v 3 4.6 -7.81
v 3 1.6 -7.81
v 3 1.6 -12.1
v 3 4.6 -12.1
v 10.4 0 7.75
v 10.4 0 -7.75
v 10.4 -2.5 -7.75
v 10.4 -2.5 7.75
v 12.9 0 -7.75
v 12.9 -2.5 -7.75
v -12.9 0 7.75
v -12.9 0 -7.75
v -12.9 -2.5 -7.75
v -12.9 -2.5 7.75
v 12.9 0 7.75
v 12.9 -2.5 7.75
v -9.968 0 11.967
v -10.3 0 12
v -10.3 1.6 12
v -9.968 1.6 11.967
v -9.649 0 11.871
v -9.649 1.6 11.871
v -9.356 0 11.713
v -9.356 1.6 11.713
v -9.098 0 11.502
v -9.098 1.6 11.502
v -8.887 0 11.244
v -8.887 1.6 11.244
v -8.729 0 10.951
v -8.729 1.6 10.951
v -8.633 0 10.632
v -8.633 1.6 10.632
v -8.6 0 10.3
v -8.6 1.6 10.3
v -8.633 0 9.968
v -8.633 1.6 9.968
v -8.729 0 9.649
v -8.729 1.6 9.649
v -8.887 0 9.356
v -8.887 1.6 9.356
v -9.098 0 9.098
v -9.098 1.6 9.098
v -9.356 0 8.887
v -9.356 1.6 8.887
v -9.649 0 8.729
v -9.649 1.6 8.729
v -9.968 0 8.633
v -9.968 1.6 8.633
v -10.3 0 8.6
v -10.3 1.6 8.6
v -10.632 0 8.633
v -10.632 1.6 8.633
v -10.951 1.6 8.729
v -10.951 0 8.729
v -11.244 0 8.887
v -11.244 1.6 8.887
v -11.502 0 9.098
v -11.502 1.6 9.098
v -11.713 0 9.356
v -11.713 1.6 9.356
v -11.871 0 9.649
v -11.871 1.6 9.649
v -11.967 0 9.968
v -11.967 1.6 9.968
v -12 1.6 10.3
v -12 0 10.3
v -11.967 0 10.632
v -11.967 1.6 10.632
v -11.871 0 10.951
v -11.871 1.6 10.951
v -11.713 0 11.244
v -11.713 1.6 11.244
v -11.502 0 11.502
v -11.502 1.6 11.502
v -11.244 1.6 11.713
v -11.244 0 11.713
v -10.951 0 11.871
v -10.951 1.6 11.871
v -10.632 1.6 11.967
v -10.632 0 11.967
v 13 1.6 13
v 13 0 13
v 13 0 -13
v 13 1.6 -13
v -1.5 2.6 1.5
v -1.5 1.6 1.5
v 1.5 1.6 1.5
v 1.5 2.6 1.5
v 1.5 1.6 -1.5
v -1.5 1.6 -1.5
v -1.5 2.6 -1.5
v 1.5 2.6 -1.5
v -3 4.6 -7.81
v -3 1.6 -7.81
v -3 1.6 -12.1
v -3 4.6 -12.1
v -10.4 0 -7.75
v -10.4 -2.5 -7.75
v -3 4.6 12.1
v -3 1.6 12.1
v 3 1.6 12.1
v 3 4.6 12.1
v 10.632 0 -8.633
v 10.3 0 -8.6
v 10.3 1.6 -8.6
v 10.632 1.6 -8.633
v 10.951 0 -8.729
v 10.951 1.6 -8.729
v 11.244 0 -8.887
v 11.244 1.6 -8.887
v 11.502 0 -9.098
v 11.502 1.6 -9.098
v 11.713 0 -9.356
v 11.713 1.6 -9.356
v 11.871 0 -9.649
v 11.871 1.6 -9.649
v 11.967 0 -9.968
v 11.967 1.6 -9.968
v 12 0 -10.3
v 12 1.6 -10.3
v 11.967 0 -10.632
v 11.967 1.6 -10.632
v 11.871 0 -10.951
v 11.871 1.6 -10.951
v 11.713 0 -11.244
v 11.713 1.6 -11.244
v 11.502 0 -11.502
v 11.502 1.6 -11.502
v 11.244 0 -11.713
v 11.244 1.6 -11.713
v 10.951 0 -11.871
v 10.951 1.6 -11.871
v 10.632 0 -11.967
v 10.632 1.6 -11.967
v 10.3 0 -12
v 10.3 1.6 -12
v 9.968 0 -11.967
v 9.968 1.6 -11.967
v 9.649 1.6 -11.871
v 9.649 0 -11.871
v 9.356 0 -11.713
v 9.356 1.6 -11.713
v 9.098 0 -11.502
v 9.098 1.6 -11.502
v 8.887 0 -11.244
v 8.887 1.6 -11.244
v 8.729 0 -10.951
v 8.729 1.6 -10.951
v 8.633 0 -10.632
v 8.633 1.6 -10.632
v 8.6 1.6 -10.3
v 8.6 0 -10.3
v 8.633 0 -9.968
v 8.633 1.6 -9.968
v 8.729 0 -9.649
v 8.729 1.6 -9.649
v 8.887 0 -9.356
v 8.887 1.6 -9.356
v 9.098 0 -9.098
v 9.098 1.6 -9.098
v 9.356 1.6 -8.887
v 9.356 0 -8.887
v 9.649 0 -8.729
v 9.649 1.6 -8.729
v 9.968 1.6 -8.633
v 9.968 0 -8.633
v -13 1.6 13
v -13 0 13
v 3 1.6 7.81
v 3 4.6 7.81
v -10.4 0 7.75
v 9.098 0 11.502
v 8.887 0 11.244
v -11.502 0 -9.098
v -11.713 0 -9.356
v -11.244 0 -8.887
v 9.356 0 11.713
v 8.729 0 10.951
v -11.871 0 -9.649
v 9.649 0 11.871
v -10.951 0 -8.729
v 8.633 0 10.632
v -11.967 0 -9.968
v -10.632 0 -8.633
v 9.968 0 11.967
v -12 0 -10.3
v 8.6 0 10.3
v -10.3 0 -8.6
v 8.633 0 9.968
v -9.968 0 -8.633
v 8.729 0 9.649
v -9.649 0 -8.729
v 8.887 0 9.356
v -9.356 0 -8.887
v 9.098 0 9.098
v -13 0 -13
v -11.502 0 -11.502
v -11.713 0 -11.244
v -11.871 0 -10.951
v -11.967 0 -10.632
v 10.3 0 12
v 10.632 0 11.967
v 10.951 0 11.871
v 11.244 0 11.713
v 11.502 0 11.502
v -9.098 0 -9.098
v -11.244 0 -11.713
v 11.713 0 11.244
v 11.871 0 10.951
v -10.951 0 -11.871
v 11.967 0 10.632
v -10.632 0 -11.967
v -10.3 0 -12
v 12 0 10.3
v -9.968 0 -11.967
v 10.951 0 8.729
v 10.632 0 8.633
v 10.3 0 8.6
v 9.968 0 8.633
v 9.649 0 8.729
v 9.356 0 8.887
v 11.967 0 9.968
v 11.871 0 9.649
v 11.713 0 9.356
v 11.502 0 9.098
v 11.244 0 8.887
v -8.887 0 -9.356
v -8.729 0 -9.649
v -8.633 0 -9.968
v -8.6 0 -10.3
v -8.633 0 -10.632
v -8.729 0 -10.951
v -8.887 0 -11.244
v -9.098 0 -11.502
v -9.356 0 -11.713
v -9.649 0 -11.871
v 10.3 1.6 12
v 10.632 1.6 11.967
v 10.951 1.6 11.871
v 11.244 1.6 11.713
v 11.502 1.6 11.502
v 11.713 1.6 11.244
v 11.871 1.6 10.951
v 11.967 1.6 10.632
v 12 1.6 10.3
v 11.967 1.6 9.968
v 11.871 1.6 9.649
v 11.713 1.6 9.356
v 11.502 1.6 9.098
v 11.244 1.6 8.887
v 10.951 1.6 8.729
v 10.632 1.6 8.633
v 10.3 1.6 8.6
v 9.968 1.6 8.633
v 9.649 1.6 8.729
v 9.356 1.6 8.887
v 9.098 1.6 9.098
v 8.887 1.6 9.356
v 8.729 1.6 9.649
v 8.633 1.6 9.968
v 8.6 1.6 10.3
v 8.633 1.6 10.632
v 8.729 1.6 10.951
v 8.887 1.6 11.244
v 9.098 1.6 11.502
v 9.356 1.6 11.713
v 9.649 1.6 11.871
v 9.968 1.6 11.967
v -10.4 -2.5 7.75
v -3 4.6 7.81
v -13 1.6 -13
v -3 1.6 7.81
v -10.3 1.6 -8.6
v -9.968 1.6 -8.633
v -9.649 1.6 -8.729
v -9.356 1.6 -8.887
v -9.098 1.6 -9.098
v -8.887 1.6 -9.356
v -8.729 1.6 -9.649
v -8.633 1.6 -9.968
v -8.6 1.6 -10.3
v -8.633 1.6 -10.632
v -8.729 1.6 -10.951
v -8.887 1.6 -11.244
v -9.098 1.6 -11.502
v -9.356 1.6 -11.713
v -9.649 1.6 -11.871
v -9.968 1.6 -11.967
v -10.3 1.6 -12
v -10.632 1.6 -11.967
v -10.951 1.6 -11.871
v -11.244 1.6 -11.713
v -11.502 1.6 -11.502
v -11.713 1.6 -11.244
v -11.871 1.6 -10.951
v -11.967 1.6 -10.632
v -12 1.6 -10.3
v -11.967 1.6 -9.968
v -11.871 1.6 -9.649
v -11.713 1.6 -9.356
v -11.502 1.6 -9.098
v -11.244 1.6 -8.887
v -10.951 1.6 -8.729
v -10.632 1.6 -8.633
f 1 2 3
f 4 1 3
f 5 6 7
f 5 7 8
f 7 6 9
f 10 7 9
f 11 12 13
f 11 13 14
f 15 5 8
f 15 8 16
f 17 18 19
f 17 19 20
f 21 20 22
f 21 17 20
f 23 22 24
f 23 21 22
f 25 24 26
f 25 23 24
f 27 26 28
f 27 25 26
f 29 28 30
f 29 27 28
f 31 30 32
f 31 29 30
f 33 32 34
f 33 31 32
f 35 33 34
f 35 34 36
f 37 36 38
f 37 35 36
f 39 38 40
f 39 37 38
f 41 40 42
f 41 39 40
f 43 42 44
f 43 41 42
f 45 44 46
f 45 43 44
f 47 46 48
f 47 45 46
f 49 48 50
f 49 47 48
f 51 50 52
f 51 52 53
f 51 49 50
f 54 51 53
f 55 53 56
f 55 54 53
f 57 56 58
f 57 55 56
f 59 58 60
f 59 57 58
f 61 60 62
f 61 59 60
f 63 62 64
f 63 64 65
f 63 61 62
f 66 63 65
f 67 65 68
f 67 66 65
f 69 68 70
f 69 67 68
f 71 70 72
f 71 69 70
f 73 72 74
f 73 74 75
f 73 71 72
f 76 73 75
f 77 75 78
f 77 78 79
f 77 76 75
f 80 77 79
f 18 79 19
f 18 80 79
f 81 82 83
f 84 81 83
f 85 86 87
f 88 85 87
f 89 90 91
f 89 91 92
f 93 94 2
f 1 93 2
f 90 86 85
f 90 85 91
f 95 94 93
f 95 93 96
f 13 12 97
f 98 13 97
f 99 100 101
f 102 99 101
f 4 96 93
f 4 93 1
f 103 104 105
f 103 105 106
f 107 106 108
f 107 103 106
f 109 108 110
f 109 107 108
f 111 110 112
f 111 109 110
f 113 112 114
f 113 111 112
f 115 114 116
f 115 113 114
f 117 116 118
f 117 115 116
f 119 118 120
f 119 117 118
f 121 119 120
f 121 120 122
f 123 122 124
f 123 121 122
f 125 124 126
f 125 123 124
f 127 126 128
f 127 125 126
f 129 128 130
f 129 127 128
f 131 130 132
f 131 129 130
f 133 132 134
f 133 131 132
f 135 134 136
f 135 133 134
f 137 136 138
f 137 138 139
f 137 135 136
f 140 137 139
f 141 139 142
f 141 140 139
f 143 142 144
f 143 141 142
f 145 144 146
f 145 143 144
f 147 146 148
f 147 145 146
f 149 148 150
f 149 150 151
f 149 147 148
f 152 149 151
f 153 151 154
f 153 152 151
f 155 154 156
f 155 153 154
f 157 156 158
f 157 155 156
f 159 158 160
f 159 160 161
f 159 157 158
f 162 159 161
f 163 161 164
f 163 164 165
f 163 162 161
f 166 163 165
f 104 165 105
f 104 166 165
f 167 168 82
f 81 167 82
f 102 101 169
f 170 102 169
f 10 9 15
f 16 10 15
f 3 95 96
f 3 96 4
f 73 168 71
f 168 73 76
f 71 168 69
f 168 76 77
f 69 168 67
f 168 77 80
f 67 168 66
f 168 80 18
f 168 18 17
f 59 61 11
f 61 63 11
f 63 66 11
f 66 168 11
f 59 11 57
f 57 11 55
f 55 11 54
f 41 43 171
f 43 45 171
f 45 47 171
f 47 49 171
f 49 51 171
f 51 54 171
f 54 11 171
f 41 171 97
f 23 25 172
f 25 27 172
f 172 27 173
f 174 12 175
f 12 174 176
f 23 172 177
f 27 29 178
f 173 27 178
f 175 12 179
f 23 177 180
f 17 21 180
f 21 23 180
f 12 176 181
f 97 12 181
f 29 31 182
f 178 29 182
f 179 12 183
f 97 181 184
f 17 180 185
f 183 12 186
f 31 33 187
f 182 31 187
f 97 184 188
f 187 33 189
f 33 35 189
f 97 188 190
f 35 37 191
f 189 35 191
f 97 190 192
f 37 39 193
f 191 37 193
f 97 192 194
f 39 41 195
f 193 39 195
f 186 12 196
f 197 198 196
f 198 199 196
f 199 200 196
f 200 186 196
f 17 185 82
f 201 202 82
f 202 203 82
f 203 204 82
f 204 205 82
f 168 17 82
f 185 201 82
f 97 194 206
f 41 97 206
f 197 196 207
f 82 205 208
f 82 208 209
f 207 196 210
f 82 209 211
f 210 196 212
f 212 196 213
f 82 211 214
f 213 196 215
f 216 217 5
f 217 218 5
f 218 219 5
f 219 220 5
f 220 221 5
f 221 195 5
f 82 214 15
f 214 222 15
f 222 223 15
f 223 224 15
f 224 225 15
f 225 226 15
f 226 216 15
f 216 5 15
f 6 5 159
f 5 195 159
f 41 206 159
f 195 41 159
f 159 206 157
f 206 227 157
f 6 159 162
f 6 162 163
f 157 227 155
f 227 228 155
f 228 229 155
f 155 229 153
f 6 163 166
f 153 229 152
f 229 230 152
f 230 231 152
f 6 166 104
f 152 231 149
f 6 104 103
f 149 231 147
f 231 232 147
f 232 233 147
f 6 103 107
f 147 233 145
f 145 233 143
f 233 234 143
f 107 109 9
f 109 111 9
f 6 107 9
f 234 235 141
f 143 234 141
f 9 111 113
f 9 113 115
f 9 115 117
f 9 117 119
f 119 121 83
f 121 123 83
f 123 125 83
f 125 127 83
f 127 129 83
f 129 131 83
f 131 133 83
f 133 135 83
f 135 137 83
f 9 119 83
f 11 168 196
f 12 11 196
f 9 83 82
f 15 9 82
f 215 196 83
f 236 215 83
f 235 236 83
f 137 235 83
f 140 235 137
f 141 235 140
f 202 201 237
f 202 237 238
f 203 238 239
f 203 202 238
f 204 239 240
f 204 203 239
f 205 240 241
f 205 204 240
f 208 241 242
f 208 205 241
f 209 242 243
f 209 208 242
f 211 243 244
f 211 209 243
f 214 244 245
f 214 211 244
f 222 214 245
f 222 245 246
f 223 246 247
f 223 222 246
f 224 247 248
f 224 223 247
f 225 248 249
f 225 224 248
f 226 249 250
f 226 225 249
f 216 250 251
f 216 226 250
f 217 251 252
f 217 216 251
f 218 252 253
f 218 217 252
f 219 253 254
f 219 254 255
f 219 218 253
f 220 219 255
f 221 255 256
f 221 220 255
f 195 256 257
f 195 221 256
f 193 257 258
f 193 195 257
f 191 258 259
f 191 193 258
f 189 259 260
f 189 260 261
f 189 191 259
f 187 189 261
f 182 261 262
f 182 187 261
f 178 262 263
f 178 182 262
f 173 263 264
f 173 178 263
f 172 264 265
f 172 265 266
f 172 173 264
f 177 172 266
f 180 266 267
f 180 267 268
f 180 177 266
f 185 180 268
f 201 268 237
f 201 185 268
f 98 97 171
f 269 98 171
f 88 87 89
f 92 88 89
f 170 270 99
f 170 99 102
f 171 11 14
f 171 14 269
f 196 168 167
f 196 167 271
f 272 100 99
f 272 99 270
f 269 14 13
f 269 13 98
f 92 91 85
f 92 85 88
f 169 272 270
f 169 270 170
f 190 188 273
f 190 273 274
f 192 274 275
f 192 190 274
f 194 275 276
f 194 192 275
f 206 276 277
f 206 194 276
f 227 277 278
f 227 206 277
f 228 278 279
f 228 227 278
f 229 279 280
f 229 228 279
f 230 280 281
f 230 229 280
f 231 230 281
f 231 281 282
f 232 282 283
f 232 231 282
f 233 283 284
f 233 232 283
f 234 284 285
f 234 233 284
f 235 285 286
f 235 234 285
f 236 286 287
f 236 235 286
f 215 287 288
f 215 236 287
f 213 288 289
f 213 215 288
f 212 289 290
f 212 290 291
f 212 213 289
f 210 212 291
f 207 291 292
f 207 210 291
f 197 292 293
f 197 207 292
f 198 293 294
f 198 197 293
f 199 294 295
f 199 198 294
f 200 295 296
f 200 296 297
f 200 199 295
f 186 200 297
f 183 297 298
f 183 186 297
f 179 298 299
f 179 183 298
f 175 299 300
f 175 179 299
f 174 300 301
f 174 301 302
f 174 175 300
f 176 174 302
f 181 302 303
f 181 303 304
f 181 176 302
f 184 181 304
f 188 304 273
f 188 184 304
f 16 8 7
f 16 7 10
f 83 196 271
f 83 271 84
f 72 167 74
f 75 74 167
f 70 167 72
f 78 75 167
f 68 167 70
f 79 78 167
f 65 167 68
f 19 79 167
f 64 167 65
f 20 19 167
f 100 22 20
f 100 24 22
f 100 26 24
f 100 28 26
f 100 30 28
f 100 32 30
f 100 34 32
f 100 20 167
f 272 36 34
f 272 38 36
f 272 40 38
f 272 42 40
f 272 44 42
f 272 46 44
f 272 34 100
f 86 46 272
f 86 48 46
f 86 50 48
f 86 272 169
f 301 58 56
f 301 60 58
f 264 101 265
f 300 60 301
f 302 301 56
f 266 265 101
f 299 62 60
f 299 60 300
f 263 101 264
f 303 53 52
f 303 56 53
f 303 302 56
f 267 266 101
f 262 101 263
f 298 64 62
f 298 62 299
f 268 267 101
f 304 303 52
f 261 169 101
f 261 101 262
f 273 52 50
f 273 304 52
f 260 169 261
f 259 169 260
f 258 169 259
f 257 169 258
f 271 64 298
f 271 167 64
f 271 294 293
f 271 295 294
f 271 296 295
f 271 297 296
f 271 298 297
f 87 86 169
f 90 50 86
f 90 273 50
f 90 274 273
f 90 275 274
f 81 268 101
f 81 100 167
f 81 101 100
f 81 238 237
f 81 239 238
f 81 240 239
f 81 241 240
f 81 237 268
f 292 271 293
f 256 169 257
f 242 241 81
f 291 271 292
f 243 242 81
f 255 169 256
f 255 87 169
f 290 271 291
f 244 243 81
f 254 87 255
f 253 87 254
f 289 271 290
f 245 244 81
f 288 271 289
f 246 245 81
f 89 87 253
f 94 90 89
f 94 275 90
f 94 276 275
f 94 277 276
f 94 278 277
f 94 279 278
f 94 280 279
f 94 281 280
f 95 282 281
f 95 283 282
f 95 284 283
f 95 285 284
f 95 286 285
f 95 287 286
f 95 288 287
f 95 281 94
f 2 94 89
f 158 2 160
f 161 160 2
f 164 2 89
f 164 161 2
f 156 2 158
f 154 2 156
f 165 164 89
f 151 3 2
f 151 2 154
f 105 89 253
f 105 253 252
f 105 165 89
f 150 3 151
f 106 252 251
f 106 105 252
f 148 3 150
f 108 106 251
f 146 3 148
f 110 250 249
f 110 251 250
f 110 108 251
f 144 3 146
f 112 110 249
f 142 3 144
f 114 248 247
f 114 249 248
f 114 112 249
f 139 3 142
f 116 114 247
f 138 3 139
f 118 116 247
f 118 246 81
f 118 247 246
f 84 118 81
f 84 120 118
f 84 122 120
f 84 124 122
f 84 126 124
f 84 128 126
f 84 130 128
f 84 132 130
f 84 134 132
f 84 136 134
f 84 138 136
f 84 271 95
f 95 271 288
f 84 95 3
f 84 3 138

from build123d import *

# Parameters (mm, degrees)
SKETCH1_W           = 26
SKETCH1_H           = 26
SKETCH1_R           = 1.7
BOSS_EXTRUDE1_DEPTH = 1.6
SKETCH2_W           = 6
SKETCH2_H           = 4.29
BOSS_EXTRUDE2_DEPTH = 3
SKETCH3_W           = 2.5
SKETCH3_H           = 15.5
BOSS_EXTRUDE3_DEPTH = 2.5
SKETCH4_W           = 3
SKETCH4_H           = 3
BOSS_EXTRUDE4_DEPTH = 1


with BuildPart() as part:
    # Sketch1 → Boss-Extrude1 (new body)
    with BuildSketch(Plane(origin=(0, 0, 0), x_dir=(1, 0, 0), z_dir=(0, 1, 0))):
        Rectangle(SKETCH1_W, SKETCH1_H)
        with Locations(Location((-10.3, 10.3, 0), (0, 0, 270))):
            Circle(SKETCH1_R, mode=Mode.SUBTRACT)
        with Locations(Location((10.3, 10.3, 0), (0, 0, 270))):
            Circle(SKETCH1_R, mode=Mode.SUBTRACT)
        with Locations(Location((-10.3, -10.3, 0), (0, 0, 270))):
            Circle(SKETCH1_R, mode=Mode.SUBTRACT)
        with Locations(Location((10.3, -10.3, 0), (0, 0, 270))):
            Circle(SKETCH1_R, mode=Mode.SUBTRACT)
    extrude(amount=BOSS_EXTRUDE1_DEPTH)

    # Sketch2 → Boss-Extrude2 (add)
    with BuildSketch(Plane(origin=(0, 1.6, 0), x_dir=(1, 0, 0), z_dir=(0, 1, 0))):
        with Locations((0, 9.955)):
            Rectangle(SKETCH2_W, SKETCH2_H)
        with Locations((0, -9.955)):
            Rectangle(SKETCH2_W, SKETCH2_H)
    extrude(amount=BOSS_EXTRUDE2_DEPTH)

    # Sketch3 → Boss-Extrude3 (add)
    with BuildSketch(Plane.XZ):
        with Locations((-11.65, 0)):
            Rectangle(SKETCH3_W, SKETCH3_H)
        with Locations((11.65, 0)):
            Rectangle(SKETCH3_W, SKETCH3_H)
    extrude(amount=BOSS_EXTRUDE3_DEPTH)

    # Sketch4 → Boss-Extrude4 (add)
    with BuildSketch(Plane(origin=(0, 1.6, 0), x_dir=(1, 0, 0), z_dir=(0, 1, 0))):
        Rectangle(SKETCH4_W, SKETCH4_H)
    extrude(amount=BOSS_EXTRUDE4_DEPTH)


solid = part.part
